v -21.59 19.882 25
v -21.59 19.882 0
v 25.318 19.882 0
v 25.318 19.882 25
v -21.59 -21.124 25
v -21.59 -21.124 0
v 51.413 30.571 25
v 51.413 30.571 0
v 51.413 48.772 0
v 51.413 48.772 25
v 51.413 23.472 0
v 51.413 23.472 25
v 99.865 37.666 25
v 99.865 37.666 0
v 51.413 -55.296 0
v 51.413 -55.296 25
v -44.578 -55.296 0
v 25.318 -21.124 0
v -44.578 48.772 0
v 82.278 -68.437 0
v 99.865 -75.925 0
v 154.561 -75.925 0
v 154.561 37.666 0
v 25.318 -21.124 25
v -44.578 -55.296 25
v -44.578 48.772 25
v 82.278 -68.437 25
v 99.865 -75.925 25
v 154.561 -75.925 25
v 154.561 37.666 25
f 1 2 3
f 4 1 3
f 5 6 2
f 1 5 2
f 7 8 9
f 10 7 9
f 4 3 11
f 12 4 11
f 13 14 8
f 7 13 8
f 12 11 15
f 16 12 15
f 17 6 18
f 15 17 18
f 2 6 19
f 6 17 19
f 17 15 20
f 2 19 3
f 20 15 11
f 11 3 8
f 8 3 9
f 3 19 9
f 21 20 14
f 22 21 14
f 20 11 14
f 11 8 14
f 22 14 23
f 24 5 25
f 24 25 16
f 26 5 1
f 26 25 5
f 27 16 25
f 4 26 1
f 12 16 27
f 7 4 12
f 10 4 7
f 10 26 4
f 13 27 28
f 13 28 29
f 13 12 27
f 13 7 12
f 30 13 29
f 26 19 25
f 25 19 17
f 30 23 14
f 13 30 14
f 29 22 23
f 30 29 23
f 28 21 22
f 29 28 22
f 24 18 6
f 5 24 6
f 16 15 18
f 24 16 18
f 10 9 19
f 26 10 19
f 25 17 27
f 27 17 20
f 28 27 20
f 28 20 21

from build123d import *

# Parameters (mm, degrees)
F1_DEPTH = 25


with BuildPart() as f1:
    # F0 (on Top) → F1 (new body)
    with BuildSketch(Plane.XY):
        Polygon((51.4127239585, 48.7721934915), (-37.7440825105, 48.7721934915), (-44.5784032345, 48.7721934915), (-44.5784032345, -55.2958585322), (-21.5902365744, -21.1242605001), (-21.5902365744, 19.8816582561), (51.4127239585, 30.571033374), align=None)
        Polygon((99.8647660017, 37.6655682921), (51.4127239585, 30.571033374), (51.4127239585, 23.4723131254), (99.8647660017, 30.1393648456), align=None)
        Polygon((51.4127239585, 23.4723131254), (51.4127239585, 30.571033374), (-21.5902365744, 19.8816582561), (25.3180470318, 19.8816582561), align=None)
        Polygon((-21.5902365744, -21.1242605001), (-44.5784032345, -55.2958585322), (51.4127239585, -55.2958585322), (25.3180470318, -21.1242605001), align=None)
        Polygon((51.4127239585, -55.2958585322), (-44.5784032345, -55.2958585322), (82.2778115873, -68.4372480694), align=None)
        Polygon((99.8647660017, 30.1393648456), (51.4127239585, 23.4723131254), (51.4127239585, -55.2958585322), (82.2778115873, -68.4372480694), (99.8647660017, -70.2591297885), align=None)
        Polygon((154.5605957508, 37.6655682921), (99.8647660017, 37.6655682921), (99.8647660017, 30.1393648456), align=None)
        Polygon((99.8647660017, -70.2591297885), (82.2778115873, -68.4372480694), (99.8647660017, -75.9252235293), align=None)
        Polygon((154.5605957508, 37.6655682921), (99.8647660017, 30.1393648456), (99.8647660017, -70.2591297885), (154.5605957508, -75.9252235293), align=None)
        Polygon((154.5605957508, -75.9252235293), (99.8647660017, -70.2591297885), (99.8647660017, -75.9252235293), align=None)
    extrude(amount=F1_DEPTH)


solid = f1.part
